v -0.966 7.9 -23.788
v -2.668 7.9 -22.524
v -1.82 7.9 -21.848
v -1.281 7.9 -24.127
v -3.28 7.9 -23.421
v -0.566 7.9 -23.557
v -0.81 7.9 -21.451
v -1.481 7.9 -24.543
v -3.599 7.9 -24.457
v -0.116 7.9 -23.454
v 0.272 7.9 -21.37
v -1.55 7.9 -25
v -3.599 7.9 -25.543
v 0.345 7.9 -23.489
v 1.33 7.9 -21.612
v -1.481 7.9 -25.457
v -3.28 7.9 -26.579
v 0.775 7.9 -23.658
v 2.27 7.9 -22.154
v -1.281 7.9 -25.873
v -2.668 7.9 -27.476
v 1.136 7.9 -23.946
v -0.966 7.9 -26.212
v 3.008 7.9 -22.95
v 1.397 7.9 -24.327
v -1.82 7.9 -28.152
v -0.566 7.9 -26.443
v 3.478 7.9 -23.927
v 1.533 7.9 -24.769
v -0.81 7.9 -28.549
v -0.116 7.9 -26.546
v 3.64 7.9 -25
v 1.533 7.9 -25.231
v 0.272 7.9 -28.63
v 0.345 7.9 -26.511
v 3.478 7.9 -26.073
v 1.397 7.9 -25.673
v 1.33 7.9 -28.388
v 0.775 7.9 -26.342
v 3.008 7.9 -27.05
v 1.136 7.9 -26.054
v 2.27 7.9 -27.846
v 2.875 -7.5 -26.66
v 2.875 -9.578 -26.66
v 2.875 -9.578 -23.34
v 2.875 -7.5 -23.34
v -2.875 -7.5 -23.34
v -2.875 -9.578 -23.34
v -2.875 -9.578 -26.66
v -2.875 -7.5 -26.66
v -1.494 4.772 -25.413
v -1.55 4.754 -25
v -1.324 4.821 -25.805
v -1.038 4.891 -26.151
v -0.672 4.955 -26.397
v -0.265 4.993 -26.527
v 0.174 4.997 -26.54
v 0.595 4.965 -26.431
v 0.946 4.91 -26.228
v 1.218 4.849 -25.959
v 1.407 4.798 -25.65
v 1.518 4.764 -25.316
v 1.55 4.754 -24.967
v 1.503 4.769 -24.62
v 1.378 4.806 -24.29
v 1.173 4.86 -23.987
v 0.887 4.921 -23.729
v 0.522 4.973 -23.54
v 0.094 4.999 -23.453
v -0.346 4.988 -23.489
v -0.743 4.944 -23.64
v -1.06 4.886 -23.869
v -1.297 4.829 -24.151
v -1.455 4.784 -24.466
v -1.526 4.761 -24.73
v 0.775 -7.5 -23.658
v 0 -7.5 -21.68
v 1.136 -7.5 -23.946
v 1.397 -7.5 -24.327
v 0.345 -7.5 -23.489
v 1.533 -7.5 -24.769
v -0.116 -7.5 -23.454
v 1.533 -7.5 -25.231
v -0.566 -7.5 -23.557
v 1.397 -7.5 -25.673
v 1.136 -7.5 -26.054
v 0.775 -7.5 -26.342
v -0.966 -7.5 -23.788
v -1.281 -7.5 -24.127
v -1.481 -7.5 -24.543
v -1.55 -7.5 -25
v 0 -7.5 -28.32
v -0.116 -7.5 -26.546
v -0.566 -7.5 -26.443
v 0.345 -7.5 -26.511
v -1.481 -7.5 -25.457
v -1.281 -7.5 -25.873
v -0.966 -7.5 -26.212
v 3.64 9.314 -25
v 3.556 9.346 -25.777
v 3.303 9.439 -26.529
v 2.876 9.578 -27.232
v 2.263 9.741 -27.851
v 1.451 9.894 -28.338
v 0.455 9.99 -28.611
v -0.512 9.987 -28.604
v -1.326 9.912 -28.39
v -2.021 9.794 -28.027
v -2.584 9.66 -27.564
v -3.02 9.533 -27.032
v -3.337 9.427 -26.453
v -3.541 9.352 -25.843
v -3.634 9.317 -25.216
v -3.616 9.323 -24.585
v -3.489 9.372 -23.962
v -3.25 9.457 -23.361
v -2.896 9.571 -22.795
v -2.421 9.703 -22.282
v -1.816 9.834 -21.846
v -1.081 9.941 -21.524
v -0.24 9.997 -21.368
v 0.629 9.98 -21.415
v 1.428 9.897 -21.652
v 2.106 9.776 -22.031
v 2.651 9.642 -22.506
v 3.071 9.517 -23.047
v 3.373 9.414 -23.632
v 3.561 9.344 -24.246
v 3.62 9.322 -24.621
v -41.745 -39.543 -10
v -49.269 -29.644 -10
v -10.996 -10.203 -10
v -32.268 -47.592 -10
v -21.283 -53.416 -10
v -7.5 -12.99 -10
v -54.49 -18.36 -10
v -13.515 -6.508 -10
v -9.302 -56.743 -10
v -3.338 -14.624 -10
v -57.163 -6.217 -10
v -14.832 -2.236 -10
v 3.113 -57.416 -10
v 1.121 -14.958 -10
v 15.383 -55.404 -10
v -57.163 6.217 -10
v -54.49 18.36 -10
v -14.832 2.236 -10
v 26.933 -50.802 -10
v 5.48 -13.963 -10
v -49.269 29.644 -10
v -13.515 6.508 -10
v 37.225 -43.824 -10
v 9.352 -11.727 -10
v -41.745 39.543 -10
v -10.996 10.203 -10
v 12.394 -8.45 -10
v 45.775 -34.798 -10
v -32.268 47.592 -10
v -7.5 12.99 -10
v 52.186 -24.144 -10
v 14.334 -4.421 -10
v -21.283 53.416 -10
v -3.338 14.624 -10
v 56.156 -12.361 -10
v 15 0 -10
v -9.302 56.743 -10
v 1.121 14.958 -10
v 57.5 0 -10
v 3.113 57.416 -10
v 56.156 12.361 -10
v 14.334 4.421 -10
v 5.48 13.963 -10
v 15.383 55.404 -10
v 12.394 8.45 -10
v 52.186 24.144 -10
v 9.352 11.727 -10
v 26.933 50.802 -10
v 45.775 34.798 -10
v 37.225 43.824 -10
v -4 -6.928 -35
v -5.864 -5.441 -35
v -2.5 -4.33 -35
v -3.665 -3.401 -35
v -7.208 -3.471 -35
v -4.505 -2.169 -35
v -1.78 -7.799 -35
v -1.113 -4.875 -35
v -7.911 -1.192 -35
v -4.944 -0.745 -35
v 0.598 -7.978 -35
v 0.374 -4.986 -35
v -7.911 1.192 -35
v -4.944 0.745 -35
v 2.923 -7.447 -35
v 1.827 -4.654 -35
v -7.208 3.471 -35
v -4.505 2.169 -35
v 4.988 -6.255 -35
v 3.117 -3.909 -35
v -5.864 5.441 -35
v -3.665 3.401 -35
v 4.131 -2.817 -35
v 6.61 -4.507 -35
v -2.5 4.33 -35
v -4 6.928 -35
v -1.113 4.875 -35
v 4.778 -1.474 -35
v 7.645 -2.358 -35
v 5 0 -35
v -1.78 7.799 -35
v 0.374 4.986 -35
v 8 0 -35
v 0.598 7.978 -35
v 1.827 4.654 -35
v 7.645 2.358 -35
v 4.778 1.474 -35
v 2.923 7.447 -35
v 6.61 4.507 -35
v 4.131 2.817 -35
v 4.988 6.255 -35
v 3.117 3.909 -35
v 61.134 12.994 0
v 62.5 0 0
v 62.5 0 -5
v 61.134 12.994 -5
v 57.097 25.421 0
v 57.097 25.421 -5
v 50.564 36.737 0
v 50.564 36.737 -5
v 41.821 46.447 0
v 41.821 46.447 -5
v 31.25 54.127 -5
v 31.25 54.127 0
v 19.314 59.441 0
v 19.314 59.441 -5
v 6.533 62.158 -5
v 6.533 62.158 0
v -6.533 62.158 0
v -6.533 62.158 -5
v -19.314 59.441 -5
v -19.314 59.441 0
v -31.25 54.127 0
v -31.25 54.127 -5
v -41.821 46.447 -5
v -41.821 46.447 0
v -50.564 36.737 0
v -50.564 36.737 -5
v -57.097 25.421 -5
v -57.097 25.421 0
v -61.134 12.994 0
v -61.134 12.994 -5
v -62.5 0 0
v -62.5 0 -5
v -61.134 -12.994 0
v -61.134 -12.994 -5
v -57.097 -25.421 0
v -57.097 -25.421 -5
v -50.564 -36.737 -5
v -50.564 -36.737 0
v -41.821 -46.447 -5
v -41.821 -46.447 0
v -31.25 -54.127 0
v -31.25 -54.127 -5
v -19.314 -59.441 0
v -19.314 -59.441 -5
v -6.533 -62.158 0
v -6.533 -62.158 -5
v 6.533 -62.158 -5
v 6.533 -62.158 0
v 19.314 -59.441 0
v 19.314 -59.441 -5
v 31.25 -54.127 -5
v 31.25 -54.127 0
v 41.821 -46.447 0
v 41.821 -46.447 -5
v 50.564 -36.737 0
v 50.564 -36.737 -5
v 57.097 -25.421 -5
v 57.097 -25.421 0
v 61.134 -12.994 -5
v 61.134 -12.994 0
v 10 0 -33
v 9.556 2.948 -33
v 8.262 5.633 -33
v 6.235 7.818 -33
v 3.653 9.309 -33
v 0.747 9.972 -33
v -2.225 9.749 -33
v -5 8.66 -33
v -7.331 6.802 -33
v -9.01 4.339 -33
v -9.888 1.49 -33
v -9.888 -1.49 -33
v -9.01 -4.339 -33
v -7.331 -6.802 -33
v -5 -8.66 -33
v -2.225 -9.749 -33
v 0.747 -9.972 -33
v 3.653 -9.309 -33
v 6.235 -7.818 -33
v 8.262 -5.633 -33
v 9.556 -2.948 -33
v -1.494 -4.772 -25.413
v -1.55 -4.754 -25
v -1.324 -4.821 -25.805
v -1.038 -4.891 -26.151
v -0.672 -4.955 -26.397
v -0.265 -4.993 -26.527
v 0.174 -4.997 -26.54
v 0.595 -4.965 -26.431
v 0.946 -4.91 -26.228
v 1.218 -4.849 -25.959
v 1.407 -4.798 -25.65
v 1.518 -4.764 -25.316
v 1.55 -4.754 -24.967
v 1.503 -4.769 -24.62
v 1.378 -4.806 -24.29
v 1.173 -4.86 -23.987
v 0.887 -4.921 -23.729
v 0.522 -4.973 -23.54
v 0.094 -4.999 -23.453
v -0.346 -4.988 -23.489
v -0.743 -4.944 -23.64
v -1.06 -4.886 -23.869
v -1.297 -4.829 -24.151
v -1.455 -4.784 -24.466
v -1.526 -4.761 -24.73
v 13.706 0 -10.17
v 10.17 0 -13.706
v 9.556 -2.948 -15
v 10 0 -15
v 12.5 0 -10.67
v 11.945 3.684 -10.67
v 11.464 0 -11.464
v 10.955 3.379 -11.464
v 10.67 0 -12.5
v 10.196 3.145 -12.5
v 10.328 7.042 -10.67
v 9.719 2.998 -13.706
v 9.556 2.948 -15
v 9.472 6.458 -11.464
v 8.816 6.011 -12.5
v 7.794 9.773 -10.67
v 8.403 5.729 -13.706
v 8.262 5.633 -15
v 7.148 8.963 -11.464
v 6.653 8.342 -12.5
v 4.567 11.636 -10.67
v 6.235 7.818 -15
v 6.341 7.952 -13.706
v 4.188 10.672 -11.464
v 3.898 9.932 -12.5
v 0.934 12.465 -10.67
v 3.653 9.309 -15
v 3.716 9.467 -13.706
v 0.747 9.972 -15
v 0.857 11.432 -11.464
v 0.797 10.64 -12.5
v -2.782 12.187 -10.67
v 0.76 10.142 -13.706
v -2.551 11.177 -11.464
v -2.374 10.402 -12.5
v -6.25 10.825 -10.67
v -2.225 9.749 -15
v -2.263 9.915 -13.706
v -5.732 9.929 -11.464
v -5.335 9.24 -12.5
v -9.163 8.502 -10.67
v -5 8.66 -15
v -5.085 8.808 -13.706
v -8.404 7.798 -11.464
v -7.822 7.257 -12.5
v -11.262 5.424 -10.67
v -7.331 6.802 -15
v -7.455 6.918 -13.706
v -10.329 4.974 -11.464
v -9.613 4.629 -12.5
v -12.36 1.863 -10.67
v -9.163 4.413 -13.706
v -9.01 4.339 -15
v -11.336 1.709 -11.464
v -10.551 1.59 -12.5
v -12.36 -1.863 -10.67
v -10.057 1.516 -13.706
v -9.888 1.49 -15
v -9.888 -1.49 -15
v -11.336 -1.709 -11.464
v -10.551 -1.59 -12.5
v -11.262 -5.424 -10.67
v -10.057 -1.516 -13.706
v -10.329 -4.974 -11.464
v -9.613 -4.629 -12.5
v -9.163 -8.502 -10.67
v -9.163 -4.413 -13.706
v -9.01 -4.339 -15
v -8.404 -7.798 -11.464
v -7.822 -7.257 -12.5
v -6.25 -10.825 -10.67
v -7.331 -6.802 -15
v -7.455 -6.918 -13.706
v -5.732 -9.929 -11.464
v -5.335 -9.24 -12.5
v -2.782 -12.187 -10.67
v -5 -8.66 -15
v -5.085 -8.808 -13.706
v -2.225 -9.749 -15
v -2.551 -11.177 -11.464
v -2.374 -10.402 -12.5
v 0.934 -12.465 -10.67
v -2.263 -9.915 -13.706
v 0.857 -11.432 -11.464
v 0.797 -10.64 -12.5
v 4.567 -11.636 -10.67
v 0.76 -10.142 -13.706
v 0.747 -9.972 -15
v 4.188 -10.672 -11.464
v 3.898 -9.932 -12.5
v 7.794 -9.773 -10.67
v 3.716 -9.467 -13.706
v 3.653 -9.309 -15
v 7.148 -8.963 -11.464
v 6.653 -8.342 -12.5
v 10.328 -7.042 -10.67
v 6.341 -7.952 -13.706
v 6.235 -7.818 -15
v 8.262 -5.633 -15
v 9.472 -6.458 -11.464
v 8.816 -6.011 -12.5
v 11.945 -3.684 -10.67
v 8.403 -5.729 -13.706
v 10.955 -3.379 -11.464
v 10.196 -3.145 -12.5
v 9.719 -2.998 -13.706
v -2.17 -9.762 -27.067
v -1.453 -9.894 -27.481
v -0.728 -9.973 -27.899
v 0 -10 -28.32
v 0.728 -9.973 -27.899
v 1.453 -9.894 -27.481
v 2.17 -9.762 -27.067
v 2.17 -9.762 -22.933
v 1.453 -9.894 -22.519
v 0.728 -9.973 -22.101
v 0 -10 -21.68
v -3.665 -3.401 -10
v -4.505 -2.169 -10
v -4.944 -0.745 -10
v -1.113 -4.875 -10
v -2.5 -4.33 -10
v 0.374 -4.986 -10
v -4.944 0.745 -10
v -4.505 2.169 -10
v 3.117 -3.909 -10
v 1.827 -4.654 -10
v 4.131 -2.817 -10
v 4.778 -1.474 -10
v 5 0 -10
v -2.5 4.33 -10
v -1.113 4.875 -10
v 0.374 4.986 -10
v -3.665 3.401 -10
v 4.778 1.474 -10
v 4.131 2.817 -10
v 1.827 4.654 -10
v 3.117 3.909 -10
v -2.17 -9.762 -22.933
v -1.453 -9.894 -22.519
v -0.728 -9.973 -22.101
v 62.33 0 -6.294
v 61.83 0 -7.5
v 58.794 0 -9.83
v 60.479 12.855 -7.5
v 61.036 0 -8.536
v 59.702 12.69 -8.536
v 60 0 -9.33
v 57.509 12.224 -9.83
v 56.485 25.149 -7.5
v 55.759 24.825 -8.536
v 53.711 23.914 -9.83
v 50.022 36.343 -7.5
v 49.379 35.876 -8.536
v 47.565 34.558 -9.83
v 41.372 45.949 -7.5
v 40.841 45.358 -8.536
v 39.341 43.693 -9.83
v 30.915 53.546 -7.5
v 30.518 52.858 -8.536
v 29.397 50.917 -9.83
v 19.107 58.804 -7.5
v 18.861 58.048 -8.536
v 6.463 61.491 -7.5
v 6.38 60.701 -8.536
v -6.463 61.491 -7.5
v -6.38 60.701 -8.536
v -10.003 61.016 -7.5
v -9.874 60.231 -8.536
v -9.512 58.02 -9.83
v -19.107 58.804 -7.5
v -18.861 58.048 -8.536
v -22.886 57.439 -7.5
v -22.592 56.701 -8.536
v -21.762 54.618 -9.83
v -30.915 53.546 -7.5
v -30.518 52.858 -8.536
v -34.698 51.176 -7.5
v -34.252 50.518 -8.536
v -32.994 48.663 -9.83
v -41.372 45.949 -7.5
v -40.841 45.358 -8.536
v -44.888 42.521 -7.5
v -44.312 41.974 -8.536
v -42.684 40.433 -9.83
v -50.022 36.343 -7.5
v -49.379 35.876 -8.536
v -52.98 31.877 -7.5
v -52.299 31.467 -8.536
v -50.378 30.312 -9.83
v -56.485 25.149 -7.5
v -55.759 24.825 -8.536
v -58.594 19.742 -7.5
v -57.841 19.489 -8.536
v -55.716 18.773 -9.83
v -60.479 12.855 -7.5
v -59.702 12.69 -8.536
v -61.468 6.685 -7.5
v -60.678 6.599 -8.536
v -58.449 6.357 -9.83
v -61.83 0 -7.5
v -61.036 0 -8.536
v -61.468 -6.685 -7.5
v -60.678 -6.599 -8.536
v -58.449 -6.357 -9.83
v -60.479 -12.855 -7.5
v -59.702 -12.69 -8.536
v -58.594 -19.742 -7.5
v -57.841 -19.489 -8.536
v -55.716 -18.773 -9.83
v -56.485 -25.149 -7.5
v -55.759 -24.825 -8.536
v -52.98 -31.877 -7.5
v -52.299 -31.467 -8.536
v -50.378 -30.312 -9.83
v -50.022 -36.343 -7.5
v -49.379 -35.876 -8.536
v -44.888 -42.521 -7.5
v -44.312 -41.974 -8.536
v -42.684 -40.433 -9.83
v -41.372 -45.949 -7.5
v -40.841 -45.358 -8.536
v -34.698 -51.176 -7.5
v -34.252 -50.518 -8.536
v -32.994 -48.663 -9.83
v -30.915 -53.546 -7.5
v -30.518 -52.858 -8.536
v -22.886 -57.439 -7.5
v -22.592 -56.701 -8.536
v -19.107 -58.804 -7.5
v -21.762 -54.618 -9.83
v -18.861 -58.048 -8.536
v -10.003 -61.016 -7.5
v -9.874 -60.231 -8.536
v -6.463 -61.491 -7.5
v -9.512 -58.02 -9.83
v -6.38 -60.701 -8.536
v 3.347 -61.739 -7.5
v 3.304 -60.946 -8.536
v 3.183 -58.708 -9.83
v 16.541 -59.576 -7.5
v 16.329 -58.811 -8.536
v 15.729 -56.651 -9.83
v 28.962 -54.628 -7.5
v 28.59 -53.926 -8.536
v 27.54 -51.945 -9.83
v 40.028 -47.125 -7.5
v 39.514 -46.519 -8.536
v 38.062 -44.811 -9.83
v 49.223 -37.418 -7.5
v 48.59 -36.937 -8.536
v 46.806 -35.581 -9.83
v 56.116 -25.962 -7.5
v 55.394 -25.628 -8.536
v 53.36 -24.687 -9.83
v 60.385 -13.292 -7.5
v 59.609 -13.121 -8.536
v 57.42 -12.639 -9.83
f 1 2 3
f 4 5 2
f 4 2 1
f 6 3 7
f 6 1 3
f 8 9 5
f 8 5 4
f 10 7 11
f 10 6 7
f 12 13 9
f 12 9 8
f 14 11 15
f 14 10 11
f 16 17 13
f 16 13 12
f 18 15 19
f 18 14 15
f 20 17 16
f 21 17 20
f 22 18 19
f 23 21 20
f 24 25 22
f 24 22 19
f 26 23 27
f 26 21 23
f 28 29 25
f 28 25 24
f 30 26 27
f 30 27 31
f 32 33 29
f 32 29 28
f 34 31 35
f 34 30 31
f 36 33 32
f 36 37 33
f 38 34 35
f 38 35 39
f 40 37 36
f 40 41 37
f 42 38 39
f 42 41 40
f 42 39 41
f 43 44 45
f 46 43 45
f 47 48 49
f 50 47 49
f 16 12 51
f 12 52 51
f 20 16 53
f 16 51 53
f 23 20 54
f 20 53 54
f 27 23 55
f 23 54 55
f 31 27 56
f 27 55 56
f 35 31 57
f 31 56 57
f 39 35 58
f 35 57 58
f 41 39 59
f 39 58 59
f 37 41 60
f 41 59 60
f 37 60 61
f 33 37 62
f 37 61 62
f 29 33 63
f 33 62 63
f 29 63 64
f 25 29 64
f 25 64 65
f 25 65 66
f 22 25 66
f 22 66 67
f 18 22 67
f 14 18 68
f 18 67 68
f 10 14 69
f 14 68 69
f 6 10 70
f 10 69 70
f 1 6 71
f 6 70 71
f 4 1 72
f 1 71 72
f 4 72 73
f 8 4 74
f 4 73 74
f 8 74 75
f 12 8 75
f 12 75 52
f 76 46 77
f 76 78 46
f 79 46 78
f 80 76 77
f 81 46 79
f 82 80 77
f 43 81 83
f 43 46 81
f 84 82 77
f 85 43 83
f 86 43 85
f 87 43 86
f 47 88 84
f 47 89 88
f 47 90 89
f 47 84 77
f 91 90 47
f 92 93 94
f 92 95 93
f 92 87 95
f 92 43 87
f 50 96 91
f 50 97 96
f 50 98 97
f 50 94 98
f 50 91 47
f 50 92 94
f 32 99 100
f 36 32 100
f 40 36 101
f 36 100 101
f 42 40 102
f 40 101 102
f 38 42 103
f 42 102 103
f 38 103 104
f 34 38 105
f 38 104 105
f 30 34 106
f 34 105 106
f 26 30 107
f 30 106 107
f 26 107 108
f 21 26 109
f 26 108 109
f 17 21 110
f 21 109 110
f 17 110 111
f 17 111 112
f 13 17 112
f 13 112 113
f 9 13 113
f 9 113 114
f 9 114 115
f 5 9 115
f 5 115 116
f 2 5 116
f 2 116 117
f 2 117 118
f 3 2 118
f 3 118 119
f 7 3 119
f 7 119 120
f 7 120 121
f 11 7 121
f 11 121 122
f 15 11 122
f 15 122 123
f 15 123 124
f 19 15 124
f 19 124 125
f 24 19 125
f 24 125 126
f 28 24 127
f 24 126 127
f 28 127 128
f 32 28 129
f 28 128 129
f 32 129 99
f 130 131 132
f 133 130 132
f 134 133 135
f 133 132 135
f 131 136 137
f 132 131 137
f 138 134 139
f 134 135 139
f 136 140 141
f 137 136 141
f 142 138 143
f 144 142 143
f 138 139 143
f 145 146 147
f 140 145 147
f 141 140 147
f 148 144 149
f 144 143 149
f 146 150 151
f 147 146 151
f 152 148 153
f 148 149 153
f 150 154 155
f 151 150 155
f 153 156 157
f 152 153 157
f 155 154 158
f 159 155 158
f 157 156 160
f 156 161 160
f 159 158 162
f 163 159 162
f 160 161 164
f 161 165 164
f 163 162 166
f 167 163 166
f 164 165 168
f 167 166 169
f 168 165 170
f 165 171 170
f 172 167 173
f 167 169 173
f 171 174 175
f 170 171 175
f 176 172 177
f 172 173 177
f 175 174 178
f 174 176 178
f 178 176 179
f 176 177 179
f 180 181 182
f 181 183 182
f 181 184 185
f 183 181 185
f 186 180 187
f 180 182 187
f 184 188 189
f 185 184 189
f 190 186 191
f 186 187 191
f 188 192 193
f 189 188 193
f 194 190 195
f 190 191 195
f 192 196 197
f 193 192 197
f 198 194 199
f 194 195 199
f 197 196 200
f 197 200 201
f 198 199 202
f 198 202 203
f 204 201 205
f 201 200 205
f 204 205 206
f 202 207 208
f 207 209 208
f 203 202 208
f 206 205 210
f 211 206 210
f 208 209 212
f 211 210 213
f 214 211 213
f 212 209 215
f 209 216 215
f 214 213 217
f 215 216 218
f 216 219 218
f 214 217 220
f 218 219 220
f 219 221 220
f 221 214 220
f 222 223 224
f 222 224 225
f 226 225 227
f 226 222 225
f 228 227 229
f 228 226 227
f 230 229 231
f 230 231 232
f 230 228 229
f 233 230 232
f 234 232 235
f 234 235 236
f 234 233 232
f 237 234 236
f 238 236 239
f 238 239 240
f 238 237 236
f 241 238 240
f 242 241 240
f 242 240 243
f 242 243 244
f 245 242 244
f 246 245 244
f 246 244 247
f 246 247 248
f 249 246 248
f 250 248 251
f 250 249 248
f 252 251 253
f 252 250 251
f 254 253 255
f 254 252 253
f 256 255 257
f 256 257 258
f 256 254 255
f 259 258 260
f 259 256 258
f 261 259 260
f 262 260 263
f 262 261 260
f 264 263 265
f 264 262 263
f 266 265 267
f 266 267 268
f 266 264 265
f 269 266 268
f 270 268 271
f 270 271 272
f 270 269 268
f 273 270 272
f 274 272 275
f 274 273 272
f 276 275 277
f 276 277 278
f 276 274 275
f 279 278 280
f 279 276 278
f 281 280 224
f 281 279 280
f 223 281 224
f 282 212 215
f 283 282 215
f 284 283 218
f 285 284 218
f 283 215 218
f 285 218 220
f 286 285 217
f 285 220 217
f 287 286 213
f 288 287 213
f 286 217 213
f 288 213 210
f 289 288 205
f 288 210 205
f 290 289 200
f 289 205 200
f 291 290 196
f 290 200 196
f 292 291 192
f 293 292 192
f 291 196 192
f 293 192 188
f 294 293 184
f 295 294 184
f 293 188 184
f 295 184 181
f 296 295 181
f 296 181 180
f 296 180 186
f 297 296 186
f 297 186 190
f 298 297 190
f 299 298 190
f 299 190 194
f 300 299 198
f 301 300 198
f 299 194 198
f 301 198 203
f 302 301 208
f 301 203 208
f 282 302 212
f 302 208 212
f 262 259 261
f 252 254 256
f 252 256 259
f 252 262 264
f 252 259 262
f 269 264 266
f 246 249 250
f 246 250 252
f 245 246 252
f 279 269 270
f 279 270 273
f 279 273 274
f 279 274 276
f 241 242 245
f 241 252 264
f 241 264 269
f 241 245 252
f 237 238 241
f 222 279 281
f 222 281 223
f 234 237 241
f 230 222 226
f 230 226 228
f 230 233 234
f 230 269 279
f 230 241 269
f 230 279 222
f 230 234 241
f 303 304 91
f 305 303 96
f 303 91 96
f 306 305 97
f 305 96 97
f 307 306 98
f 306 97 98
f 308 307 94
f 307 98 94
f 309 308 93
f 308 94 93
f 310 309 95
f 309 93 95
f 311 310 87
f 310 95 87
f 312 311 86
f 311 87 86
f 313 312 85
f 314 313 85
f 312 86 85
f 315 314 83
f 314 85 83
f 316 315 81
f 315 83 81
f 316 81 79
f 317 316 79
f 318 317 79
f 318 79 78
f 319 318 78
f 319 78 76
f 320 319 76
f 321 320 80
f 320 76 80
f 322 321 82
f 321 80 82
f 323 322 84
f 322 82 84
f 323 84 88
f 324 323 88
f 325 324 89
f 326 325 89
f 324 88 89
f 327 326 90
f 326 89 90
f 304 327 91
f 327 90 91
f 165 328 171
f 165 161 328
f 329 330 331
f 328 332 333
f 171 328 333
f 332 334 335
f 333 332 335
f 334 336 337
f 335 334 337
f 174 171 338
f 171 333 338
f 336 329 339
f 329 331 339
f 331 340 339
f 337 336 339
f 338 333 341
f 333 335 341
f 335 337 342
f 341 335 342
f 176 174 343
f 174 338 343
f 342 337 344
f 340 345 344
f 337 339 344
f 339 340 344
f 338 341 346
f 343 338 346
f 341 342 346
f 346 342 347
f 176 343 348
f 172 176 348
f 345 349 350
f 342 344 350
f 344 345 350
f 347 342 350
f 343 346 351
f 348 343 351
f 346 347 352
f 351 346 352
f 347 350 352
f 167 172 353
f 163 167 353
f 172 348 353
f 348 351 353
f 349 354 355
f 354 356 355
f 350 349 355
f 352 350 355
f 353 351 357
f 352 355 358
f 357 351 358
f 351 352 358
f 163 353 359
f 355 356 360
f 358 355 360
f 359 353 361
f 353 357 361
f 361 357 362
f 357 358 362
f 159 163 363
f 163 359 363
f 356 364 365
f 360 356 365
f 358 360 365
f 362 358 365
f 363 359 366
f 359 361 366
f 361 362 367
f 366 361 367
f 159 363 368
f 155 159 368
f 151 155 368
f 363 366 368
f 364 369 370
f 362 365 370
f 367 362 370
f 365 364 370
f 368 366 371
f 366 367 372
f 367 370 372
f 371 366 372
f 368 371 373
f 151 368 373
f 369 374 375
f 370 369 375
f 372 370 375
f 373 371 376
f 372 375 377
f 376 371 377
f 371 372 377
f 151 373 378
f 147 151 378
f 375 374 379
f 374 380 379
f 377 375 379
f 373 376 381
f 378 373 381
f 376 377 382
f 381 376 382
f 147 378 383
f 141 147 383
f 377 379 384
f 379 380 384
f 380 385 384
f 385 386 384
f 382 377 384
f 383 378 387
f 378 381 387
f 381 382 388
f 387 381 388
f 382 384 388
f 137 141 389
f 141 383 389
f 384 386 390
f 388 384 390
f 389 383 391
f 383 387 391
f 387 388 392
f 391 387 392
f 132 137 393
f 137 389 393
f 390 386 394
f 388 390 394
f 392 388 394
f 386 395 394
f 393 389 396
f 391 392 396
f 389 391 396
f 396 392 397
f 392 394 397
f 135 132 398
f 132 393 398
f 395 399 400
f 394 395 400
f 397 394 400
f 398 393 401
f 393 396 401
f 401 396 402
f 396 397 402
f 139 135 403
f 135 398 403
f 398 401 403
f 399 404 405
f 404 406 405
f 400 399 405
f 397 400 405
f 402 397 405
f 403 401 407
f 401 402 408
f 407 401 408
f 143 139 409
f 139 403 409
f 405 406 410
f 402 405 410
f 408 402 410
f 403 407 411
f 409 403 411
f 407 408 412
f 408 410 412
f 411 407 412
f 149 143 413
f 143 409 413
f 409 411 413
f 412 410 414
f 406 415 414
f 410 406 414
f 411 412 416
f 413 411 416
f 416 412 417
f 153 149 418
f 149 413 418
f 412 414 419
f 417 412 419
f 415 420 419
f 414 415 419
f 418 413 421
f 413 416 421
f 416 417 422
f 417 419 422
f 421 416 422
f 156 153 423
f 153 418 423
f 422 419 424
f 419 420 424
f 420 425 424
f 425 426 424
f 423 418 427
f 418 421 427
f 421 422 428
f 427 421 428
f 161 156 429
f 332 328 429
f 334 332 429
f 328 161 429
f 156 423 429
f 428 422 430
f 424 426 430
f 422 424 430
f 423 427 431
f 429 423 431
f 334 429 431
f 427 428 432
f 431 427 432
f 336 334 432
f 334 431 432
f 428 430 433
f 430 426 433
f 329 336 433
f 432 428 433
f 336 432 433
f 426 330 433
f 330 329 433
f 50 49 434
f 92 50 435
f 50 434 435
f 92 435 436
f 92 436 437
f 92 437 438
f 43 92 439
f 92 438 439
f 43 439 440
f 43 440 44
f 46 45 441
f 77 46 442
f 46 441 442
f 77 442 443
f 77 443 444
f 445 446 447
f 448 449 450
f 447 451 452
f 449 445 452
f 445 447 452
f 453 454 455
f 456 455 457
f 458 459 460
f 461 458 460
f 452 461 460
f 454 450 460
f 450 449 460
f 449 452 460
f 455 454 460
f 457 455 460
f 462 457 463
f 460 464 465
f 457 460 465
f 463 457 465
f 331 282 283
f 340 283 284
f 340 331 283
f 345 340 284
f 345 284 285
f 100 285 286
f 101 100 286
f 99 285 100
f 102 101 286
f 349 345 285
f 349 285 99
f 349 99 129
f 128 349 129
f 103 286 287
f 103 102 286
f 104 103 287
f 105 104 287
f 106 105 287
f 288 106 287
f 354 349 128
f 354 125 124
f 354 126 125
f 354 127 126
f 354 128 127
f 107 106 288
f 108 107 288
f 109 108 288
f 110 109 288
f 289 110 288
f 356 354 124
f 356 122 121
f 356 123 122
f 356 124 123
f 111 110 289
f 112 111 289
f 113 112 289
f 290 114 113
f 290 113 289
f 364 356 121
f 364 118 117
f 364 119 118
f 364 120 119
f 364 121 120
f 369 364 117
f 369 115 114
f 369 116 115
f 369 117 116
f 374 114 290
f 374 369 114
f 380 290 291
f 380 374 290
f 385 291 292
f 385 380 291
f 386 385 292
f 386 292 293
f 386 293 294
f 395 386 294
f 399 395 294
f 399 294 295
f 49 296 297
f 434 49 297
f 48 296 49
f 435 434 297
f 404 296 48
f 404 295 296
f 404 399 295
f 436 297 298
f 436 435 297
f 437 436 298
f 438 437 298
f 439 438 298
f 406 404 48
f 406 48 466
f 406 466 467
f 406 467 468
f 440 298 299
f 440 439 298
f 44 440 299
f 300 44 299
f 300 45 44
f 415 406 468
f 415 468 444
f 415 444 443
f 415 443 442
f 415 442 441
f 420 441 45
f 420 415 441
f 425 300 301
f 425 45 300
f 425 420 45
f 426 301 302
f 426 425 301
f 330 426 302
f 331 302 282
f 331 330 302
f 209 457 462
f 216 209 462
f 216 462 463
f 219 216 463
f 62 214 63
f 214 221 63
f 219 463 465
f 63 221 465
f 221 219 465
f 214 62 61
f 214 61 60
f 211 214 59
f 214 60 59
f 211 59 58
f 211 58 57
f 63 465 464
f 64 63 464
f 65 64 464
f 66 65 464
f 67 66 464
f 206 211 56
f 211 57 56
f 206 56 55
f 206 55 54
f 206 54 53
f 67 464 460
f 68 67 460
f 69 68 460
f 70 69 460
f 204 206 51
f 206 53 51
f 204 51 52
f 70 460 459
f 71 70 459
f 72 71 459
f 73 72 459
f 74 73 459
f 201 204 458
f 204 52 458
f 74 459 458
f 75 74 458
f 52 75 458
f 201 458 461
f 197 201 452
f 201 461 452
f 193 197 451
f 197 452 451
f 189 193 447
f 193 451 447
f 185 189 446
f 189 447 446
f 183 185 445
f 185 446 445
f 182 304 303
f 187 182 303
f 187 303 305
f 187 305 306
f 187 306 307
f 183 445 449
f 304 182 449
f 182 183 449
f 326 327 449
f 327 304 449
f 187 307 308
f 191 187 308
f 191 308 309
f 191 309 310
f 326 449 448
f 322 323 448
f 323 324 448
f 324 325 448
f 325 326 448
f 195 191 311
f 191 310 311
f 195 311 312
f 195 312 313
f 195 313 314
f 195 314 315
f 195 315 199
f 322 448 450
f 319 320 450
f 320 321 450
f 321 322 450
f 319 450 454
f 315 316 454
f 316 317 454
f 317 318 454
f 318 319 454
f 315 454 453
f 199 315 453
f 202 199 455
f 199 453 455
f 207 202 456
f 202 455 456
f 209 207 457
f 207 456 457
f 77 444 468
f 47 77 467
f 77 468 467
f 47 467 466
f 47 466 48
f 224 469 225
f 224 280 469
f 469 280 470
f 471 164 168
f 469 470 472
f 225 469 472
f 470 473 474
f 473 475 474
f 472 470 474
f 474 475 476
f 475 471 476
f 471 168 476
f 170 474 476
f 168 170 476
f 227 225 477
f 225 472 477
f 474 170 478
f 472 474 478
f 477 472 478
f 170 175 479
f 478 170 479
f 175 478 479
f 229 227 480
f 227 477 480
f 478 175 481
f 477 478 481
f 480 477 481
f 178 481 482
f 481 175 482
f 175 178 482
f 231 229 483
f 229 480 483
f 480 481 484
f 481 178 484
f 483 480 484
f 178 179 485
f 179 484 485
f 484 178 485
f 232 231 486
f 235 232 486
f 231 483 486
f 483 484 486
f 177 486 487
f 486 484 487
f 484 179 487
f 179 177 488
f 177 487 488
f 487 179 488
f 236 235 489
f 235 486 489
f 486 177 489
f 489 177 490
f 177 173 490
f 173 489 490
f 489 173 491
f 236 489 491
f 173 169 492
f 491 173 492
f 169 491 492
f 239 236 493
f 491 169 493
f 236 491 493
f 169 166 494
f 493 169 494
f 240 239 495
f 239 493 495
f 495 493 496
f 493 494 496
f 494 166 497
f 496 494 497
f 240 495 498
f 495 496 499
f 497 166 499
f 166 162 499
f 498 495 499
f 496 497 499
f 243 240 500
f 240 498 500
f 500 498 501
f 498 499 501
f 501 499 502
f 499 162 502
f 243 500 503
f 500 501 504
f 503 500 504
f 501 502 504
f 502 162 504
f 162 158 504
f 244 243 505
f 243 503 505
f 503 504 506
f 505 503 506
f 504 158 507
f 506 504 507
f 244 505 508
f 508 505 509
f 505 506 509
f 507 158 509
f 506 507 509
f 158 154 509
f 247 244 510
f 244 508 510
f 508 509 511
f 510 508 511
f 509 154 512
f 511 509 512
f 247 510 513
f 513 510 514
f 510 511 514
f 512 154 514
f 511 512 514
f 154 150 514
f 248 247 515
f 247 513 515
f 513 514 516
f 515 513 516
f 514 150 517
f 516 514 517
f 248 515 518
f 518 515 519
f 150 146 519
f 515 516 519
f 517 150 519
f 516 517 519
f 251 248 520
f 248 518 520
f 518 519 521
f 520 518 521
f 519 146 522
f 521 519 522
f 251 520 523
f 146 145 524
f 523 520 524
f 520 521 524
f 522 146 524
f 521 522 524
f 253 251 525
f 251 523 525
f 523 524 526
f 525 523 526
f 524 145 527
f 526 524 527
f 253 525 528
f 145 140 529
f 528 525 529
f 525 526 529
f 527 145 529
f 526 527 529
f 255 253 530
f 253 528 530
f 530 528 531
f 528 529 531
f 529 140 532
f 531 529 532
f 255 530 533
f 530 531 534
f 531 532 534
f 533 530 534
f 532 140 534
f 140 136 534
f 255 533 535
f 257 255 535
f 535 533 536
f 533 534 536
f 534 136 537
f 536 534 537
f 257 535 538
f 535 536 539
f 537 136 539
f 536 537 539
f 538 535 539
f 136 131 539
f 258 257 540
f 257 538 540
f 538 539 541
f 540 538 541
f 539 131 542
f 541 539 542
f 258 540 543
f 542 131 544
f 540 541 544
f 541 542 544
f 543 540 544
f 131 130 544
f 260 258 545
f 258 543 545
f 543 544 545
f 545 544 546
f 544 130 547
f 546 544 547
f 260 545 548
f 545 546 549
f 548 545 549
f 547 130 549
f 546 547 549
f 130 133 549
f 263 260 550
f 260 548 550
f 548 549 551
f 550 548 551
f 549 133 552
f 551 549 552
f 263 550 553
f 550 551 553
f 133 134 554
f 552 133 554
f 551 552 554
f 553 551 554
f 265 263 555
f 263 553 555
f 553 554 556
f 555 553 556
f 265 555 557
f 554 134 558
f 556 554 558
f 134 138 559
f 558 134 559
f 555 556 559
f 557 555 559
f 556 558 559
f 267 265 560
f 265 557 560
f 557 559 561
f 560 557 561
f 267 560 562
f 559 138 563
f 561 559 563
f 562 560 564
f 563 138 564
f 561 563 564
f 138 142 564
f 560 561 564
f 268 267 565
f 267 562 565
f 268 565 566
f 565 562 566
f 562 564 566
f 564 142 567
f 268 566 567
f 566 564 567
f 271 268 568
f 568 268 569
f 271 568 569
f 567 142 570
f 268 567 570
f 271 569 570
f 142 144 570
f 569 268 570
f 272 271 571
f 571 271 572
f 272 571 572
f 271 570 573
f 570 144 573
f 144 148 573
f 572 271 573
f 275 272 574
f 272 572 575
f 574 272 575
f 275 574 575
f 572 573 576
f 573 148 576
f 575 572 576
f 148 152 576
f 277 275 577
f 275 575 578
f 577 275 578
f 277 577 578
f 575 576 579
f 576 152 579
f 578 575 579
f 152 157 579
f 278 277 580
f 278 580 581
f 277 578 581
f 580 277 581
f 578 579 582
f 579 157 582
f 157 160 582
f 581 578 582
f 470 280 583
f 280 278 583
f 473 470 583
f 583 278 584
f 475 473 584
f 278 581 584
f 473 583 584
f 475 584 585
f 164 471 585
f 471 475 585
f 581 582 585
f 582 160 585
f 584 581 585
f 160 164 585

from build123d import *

# Parameters (mm, degrees)
BASE_SKETCH_R                                      = 62.5
BOSS_EXTRUDE1_DEPTH                                = 10
BOSS_EXTRUDE2_START                                = -10
BASE_SKETCH_3_R                                    = 10
BASE_SKETCH_3_R_2                                  = 5
BOSS_EXTRUDE2_DEPTH                                = 25
FILLET1_R                                          = 5
CHAMFER1_SIZE                                      = 2
CBORE_FOR_M2_5_HEX_HEAD_MACHINE_SCREW1_D           = 3.1
CBORE_FOR_M2_5_HEX_HEAD_MACHINE_SCREW1_CBORE_D     = 7.28
CBORE_FOR_M2_5_HEX_HEAD_MACHINE_SCREW1_CBORE_DEPTH = 2.1
CUT_EXTRUDE2_DEPTH                                 = 2.5


with BuildPart() as part:
    # Base_Sketch → Boss-Extrude1 (new body)
    with BuildSketch(Plane.XY):
        Circle(BASE_SKETCH_R)
    extrude(amount=-BOSS_EXTRUDE1_DEPTH)

    # Base_Sketch<3> → Boss-Extrude2 (add)
    with BuildSketch(Plane.XY.offset(BOSS_EXTRUDE2_START)):
        Circle(BASE_SKETCH_3_R)
        Circle(BASE_SKETCH_3_R_2, mode=Mode.SUBTRACT)
    extrude(amount=-BOSS_EXTRUDE2_DEPTH)

    # Fillet1
    fillet1_edges = [part.edges().sort_by_distance(p)[0] for p in [
        (-62.5, 0, -10),
        (-10, 0, -10),
    ]]
    fillet(fillet1_edges, radius=FILLET1_R)

    # Chamfer1
    chamfer1_edges = [part.edges().sort_by_distance(p)[0] for p in [
        (-10, 0, -35),
    ]]
    chamfer(chamfer1_edges, length=CHAMFER1_SIZE)

    # CBORE for M2.5 Hex Head Machine Screw1 (through all)
    with Locations(Plane(origin=(0, 10, -25), x_dir=(1, 0, 0), z_dir=(0, 1, 0))):
        with Locations((0, 0)):
            CounterBoreHole(CBORE_FOR_M2_5_HEX_HEAD_MACHINE_SCREW1_D / 2, CBORE_FOR_M2_5_HEX_HEAD_MACHINE_SCREW1_CBORE_D / 2, CBORE_FOR_M2_5_HEX_HEAD_MACHINE_SCREW1_CBORE_DEPTH)

    # Nut_Extrude → Cut-Extrude2 (cut)
    with BuildSketch(Plane(origin=(0, -10, -35), x_dir=(-1, 0, 0), z_dir=(0, -1, 0))):
        Polygon((2.875, -11.659882024), (2.875, -8.340117976), (0, -6.680235952), (-2.875, -8.340117976), (-2.875, -11.659882024), (0, -13.319764048), align=None)
    extrude(amount=-CUT_EXTRUDE2_DEPTH, mode=Mode.SUBTRACT)


solid = part.part
